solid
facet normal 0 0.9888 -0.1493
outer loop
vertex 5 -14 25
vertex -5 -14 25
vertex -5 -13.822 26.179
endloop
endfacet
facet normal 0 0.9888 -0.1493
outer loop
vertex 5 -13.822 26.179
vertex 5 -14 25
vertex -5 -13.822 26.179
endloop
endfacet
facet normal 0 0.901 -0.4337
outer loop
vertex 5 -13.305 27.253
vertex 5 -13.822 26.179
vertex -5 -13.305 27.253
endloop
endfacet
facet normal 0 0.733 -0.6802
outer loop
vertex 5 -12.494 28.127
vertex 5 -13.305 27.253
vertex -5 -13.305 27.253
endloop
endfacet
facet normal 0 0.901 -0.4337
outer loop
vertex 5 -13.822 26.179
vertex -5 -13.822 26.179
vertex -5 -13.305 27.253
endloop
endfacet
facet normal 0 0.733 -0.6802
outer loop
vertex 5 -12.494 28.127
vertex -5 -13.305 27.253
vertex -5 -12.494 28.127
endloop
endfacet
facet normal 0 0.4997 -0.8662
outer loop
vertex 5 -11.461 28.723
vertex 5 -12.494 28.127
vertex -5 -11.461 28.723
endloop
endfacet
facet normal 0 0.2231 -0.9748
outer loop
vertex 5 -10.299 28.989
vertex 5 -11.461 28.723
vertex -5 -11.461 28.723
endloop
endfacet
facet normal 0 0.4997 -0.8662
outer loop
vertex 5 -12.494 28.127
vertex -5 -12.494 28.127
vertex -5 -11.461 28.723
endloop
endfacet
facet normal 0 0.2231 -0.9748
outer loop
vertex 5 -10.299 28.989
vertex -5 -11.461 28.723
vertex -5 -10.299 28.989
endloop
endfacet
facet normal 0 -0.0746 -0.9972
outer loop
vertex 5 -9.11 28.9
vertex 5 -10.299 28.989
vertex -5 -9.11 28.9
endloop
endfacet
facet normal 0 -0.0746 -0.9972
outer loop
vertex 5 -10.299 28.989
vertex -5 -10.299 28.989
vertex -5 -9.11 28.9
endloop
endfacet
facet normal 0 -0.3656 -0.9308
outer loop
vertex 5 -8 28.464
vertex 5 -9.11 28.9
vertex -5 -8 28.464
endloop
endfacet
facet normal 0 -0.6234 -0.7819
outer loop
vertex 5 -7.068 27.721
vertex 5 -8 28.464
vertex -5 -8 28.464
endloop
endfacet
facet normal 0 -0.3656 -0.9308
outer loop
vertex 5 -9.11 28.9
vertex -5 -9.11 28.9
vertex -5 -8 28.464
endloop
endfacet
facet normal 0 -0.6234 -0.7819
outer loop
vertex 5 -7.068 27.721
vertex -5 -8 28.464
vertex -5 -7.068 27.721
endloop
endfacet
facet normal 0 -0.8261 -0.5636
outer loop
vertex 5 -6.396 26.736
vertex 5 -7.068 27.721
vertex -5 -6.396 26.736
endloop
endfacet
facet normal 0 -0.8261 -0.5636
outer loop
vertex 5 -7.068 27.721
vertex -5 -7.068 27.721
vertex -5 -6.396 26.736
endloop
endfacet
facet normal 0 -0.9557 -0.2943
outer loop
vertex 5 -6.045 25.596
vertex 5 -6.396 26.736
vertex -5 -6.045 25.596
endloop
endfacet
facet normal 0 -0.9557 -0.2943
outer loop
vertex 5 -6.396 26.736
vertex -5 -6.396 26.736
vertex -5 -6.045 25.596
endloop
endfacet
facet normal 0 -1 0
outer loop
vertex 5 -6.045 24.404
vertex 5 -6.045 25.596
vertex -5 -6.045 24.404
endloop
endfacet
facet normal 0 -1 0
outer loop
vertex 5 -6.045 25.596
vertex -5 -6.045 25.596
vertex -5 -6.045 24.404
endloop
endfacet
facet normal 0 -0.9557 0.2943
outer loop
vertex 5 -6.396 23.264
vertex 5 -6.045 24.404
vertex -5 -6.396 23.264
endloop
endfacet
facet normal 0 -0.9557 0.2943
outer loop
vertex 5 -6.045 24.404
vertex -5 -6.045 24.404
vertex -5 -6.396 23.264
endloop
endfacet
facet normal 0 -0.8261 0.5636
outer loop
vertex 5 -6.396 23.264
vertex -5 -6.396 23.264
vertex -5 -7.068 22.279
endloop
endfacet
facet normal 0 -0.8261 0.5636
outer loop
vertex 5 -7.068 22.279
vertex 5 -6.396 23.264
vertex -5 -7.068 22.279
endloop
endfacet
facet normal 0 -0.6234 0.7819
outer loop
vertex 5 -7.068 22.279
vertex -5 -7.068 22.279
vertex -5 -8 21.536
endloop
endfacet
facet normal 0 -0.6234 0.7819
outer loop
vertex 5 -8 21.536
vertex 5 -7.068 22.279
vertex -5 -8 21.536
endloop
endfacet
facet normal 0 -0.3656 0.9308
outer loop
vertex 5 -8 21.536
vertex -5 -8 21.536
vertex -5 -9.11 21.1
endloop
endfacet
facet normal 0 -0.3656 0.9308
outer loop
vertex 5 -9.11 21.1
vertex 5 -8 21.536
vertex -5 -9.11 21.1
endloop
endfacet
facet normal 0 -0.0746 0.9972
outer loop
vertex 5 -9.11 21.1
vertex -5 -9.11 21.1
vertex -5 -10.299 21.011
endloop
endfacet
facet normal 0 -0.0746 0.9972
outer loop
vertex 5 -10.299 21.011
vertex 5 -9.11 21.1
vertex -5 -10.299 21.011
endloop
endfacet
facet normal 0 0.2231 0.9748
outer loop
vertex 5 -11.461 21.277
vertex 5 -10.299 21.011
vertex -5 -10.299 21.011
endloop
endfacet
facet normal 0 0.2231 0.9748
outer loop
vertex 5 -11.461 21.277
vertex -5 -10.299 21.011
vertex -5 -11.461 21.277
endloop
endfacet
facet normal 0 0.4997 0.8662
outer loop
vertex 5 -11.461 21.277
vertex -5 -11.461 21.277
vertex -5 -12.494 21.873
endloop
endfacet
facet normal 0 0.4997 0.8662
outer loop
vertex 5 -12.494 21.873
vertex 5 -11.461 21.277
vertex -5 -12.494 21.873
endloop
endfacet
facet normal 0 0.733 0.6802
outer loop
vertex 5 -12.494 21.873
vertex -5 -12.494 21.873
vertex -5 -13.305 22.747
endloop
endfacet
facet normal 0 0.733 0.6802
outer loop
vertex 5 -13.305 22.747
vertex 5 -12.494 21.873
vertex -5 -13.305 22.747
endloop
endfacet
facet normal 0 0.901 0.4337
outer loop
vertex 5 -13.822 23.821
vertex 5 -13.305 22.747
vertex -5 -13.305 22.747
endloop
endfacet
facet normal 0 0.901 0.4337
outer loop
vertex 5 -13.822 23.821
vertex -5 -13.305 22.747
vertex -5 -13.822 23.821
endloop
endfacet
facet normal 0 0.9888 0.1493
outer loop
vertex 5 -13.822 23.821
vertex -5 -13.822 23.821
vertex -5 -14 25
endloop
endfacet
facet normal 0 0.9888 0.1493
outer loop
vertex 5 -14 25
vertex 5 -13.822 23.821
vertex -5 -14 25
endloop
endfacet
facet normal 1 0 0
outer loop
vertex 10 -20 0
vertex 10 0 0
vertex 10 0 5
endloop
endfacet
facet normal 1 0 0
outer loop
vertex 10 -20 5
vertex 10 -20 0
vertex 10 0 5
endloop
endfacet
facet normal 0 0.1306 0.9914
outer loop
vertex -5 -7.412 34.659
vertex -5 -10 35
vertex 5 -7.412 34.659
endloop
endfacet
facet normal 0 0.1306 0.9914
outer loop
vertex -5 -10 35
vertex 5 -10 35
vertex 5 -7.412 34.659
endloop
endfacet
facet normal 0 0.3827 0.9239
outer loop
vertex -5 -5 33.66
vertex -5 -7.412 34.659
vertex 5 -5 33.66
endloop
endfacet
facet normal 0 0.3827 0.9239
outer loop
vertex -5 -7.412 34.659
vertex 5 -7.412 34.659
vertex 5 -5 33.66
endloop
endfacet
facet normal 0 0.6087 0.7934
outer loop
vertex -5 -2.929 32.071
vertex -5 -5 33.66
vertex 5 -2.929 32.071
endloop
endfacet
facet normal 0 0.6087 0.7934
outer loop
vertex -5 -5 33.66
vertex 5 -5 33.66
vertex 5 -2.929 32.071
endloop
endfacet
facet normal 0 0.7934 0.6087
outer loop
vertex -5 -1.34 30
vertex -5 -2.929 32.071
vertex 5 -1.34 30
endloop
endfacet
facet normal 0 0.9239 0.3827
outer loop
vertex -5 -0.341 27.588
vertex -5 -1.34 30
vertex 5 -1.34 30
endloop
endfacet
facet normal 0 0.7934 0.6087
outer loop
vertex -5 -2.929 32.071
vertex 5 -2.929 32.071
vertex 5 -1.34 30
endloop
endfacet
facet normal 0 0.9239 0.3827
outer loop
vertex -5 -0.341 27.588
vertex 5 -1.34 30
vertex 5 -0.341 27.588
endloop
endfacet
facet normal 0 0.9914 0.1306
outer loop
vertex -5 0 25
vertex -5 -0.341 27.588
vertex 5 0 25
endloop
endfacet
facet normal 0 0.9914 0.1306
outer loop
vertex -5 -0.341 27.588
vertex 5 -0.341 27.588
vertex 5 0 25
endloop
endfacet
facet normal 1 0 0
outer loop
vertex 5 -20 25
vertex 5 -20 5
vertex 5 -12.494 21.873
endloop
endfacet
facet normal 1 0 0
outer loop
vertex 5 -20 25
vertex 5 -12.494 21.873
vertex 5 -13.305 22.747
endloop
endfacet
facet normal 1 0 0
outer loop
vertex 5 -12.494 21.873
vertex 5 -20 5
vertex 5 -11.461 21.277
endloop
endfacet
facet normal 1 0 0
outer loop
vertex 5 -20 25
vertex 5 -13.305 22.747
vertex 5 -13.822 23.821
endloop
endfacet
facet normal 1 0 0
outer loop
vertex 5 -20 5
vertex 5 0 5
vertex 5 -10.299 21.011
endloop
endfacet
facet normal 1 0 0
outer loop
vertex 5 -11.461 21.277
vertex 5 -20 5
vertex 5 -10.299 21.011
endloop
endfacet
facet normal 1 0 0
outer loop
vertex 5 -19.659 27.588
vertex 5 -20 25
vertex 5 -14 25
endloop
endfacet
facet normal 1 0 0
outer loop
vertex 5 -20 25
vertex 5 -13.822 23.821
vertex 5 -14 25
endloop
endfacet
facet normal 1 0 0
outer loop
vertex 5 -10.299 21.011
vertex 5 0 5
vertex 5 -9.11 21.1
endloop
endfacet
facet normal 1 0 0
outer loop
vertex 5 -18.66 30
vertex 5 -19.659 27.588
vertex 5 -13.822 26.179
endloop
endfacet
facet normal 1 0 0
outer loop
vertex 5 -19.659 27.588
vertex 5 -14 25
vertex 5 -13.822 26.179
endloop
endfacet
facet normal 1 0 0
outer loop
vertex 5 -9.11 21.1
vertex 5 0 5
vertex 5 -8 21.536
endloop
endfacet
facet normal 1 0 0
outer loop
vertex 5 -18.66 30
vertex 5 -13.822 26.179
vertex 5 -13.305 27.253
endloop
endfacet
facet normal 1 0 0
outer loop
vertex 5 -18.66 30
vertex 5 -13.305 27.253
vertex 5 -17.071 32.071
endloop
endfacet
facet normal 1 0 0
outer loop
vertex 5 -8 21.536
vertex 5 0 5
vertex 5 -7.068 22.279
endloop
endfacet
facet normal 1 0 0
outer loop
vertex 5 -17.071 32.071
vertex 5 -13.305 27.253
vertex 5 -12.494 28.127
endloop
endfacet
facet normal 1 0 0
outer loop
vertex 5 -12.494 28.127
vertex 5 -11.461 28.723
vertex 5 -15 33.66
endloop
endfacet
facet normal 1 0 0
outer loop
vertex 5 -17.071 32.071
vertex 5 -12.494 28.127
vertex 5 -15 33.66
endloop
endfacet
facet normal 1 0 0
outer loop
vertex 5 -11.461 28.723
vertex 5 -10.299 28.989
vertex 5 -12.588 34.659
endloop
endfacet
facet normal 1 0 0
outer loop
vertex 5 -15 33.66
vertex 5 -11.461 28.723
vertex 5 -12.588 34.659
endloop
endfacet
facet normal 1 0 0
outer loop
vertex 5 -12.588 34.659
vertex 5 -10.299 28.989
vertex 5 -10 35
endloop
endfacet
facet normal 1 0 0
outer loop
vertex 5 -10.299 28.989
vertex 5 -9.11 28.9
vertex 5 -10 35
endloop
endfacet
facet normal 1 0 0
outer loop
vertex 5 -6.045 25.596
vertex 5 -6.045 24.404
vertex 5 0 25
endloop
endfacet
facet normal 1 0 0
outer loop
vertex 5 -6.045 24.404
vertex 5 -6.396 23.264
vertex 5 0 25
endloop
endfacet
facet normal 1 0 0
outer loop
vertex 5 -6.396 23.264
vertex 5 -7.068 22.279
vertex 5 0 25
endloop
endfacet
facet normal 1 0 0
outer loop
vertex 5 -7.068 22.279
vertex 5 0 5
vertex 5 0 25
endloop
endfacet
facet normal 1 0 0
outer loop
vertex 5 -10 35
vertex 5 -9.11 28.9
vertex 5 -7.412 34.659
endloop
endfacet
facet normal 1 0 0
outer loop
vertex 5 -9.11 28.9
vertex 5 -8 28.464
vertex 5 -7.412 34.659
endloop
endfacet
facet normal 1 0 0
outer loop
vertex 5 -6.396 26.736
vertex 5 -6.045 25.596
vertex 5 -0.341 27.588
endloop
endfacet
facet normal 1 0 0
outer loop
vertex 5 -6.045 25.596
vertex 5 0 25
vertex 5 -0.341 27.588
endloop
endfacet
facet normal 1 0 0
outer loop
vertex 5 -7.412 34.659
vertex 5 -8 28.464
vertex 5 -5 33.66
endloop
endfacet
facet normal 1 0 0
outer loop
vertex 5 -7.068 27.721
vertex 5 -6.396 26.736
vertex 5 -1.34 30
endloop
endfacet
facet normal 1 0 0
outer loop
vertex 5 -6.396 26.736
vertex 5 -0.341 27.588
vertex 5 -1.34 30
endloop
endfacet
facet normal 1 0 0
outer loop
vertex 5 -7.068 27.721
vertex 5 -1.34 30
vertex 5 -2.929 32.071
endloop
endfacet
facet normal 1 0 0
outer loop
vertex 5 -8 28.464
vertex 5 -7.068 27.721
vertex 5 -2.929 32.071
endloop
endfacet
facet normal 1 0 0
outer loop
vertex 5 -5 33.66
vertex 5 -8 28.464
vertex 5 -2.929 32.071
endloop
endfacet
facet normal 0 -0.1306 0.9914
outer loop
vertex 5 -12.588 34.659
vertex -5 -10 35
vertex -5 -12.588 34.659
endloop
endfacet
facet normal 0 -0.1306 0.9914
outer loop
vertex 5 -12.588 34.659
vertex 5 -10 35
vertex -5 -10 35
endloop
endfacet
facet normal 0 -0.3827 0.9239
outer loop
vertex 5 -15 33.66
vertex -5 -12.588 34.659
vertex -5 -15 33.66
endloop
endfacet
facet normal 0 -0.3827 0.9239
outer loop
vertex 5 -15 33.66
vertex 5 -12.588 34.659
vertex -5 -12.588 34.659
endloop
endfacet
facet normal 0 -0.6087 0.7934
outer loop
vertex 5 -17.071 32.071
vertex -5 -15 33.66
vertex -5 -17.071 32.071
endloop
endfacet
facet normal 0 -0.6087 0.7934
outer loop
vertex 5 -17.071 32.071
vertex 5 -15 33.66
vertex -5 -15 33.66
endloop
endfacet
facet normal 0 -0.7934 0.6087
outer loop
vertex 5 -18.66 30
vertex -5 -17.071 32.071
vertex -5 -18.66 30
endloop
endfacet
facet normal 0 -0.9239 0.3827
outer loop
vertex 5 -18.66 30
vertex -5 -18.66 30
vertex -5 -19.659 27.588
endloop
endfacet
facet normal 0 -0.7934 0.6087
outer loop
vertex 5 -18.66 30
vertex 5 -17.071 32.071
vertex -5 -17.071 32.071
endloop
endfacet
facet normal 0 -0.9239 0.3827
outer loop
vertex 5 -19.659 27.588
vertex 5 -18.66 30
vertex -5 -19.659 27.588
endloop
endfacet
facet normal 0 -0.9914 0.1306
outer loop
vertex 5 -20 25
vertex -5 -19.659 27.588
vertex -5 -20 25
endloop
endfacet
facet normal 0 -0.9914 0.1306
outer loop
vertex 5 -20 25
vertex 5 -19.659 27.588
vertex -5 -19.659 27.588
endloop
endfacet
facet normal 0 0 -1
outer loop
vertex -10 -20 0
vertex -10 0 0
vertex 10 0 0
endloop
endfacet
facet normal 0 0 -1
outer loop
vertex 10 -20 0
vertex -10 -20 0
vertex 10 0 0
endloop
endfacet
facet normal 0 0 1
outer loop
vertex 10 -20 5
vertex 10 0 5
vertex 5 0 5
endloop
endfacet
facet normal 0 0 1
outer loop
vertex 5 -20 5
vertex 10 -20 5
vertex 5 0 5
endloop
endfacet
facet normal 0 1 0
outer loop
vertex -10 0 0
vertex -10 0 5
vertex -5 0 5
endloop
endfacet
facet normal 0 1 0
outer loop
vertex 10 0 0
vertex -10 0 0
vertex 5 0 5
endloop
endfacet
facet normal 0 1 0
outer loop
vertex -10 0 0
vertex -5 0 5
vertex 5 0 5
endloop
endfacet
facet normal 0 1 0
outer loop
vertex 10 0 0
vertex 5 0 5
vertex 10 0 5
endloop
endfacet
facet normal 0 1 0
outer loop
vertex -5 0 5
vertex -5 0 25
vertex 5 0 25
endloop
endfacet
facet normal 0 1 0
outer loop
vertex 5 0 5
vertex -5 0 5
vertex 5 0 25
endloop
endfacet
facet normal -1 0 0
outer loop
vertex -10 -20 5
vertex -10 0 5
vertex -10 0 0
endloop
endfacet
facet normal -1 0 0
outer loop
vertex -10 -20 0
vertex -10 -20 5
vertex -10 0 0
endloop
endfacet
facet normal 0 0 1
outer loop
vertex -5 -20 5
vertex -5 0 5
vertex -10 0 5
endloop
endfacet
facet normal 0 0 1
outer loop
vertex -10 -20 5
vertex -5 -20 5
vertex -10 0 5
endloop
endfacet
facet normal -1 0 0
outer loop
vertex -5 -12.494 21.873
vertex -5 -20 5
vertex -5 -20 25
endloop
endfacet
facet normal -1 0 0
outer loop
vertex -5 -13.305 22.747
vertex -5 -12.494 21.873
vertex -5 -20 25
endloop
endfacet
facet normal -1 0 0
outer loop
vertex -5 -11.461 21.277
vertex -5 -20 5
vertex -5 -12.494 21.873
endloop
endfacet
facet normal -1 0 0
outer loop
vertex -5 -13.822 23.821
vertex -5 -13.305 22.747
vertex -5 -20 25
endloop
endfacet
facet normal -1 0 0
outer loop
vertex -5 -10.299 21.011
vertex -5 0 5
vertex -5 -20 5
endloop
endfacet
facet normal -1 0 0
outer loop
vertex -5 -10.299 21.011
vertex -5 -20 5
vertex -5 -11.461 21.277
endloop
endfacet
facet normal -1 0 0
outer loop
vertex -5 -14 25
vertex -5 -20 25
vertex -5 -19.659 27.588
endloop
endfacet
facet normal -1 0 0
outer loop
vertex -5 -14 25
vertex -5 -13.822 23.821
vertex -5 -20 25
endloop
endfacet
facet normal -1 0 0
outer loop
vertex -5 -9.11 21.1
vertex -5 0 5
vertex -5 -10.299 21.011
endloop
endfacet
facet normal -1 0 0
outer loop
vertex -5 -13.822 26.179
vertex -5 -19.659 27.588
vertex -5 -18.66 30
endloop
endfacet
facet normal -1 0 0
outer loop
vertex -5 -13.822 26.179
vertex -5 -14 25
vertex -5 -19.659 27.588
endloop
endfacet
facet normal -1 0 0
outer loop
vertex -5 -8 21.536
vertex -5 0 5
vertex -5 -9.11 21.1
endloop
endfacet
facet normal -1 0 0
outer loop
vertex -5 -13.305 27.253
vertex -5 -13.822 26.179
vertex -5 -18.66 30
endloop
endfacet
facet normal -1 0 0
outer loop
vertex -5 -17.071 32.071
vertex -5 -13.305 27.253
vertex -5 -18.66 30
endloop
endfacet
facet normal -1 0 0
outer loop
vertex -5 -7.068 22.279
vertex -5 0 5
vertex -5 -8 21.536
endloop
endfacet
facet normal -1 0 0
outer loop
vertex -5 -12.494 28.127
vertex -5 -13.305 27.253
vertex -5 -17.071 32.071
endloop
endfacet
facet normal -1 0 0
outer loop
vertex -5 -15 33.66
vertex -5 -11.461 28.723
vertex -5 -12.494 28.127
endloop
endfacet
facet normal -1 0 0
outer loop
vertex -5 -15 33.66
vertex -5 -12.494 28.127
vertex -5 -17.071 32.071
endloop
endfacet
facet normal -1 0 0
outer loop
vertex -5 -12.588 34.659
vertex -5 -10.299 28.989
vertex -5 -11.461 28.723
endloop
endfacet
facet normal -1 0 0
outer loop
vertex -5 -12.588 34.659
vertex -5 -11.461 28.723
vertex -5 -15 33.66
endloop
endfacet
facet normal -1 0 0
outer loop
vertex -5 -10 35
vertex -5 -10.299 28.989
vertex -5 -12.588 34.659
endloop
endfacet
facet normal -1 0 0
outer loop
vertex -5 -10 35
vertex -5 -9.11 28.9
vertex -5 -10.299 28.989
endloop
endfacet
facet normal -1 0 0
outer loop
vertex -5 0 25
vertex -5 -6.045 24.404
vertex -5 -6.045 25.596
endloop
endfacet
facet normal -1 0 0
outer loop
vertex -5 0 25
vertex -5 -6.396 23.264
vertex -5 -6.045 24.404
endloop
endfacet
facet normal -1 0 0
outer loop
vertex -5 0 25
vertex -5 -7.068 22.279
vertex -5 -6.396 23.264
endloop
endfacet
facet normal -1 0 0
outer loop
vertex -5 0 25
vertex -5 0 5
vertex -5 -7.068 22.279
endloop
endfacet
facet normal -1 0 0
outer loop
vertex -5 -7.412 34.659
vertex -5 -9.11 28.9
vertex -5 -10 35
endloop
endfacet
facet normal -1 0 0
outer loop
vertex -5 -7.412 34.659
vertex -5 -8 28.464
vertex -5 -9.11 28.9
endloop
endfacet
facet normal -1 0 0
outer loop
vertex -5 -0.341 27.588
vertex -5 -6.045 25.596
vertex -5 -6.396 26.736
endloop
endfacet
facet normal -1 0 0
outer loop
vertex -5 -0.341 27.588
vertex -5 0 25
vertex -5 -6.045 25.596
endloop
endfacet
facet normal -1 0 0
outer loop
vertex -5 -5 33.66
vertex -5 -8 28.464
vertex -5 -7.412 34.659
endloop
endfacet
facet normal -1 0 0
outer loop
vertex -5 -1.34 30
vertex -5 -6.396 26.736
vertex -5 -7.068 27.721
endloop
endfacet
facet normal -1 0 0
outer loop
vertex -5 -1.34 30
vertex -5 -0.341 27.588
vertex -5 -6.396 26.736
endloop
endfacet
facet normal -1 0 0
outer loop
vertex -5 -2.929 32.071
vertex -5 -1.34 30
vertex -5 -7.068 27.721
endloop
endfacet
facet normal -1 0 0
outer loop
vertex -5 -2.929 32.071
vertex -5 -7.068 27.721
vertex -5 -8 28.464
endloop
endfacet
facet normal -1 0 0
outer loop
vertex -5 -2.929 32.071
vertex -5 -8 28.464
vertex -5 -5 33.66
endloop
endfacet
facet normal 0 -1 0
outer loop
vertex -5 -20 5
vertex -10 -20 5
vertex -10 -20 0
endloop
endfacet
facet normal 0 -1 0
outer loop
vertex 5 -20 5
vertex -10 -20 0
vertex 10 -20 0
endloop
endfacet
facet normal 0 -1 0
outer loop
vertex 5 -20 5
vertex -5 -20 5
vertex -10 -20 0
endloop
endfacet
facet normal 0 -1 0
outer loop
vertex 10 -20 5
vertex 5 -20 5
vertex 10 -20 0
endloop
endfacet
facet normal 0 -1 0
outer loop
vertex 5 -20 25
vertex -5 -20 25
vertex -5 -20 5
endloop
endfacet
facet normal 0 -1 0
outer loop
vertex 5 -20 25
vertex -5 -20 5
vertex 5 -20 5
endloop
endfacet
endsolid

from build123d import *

# Parameters (mm, degrees)
F0_W     = 10
F0_H     = 30
F1_DEPTH = 20
F2_R     = 9.99999
F3_R     = 4
F4_DEPTH = 15.001


# Not quite as in the source:
# - a fillet or chamfer is up to 0.001 mm smaller than in the source, because OpenCascade refuses the exact size


with BuildPart() as f1:
    # F0 (on Front) → F1 (new body)
    with BuildSketch(Plane.XZ):
        with Locations((0, 20)):
            Rectangle(F0_W, F0_H)
        Polygon((-5, 5), (-10, 5), (-10, 0), (10, 0), (10, 5), (5, 5), align=None)
    extrude(amount=F1_DEPTH)

    # F2 (radius 10 in the source; OpenCascade refuses exactly that, so slightly less here)
    f2_edges = [f1.edges().sort_by_distance(p)[0] for p in [
        (0, 0, 35),
        (0, -20, 35),
    ]]
    fillet(f2_edges, radius=F2_R)

    # F3 (on face) → F4 (cut, through all)
    with BuildSketch(Plane(origin=(-5, 0, 0), x_dir=(0, -1, 0), z_dir=(-1, 0, 0))):
        with Locations((10, 25)):
            Circle(F3_R)
    extrude(amount=-F4_DEPTH, mode=Mode.SUBTRACT)


solid = f1.part
